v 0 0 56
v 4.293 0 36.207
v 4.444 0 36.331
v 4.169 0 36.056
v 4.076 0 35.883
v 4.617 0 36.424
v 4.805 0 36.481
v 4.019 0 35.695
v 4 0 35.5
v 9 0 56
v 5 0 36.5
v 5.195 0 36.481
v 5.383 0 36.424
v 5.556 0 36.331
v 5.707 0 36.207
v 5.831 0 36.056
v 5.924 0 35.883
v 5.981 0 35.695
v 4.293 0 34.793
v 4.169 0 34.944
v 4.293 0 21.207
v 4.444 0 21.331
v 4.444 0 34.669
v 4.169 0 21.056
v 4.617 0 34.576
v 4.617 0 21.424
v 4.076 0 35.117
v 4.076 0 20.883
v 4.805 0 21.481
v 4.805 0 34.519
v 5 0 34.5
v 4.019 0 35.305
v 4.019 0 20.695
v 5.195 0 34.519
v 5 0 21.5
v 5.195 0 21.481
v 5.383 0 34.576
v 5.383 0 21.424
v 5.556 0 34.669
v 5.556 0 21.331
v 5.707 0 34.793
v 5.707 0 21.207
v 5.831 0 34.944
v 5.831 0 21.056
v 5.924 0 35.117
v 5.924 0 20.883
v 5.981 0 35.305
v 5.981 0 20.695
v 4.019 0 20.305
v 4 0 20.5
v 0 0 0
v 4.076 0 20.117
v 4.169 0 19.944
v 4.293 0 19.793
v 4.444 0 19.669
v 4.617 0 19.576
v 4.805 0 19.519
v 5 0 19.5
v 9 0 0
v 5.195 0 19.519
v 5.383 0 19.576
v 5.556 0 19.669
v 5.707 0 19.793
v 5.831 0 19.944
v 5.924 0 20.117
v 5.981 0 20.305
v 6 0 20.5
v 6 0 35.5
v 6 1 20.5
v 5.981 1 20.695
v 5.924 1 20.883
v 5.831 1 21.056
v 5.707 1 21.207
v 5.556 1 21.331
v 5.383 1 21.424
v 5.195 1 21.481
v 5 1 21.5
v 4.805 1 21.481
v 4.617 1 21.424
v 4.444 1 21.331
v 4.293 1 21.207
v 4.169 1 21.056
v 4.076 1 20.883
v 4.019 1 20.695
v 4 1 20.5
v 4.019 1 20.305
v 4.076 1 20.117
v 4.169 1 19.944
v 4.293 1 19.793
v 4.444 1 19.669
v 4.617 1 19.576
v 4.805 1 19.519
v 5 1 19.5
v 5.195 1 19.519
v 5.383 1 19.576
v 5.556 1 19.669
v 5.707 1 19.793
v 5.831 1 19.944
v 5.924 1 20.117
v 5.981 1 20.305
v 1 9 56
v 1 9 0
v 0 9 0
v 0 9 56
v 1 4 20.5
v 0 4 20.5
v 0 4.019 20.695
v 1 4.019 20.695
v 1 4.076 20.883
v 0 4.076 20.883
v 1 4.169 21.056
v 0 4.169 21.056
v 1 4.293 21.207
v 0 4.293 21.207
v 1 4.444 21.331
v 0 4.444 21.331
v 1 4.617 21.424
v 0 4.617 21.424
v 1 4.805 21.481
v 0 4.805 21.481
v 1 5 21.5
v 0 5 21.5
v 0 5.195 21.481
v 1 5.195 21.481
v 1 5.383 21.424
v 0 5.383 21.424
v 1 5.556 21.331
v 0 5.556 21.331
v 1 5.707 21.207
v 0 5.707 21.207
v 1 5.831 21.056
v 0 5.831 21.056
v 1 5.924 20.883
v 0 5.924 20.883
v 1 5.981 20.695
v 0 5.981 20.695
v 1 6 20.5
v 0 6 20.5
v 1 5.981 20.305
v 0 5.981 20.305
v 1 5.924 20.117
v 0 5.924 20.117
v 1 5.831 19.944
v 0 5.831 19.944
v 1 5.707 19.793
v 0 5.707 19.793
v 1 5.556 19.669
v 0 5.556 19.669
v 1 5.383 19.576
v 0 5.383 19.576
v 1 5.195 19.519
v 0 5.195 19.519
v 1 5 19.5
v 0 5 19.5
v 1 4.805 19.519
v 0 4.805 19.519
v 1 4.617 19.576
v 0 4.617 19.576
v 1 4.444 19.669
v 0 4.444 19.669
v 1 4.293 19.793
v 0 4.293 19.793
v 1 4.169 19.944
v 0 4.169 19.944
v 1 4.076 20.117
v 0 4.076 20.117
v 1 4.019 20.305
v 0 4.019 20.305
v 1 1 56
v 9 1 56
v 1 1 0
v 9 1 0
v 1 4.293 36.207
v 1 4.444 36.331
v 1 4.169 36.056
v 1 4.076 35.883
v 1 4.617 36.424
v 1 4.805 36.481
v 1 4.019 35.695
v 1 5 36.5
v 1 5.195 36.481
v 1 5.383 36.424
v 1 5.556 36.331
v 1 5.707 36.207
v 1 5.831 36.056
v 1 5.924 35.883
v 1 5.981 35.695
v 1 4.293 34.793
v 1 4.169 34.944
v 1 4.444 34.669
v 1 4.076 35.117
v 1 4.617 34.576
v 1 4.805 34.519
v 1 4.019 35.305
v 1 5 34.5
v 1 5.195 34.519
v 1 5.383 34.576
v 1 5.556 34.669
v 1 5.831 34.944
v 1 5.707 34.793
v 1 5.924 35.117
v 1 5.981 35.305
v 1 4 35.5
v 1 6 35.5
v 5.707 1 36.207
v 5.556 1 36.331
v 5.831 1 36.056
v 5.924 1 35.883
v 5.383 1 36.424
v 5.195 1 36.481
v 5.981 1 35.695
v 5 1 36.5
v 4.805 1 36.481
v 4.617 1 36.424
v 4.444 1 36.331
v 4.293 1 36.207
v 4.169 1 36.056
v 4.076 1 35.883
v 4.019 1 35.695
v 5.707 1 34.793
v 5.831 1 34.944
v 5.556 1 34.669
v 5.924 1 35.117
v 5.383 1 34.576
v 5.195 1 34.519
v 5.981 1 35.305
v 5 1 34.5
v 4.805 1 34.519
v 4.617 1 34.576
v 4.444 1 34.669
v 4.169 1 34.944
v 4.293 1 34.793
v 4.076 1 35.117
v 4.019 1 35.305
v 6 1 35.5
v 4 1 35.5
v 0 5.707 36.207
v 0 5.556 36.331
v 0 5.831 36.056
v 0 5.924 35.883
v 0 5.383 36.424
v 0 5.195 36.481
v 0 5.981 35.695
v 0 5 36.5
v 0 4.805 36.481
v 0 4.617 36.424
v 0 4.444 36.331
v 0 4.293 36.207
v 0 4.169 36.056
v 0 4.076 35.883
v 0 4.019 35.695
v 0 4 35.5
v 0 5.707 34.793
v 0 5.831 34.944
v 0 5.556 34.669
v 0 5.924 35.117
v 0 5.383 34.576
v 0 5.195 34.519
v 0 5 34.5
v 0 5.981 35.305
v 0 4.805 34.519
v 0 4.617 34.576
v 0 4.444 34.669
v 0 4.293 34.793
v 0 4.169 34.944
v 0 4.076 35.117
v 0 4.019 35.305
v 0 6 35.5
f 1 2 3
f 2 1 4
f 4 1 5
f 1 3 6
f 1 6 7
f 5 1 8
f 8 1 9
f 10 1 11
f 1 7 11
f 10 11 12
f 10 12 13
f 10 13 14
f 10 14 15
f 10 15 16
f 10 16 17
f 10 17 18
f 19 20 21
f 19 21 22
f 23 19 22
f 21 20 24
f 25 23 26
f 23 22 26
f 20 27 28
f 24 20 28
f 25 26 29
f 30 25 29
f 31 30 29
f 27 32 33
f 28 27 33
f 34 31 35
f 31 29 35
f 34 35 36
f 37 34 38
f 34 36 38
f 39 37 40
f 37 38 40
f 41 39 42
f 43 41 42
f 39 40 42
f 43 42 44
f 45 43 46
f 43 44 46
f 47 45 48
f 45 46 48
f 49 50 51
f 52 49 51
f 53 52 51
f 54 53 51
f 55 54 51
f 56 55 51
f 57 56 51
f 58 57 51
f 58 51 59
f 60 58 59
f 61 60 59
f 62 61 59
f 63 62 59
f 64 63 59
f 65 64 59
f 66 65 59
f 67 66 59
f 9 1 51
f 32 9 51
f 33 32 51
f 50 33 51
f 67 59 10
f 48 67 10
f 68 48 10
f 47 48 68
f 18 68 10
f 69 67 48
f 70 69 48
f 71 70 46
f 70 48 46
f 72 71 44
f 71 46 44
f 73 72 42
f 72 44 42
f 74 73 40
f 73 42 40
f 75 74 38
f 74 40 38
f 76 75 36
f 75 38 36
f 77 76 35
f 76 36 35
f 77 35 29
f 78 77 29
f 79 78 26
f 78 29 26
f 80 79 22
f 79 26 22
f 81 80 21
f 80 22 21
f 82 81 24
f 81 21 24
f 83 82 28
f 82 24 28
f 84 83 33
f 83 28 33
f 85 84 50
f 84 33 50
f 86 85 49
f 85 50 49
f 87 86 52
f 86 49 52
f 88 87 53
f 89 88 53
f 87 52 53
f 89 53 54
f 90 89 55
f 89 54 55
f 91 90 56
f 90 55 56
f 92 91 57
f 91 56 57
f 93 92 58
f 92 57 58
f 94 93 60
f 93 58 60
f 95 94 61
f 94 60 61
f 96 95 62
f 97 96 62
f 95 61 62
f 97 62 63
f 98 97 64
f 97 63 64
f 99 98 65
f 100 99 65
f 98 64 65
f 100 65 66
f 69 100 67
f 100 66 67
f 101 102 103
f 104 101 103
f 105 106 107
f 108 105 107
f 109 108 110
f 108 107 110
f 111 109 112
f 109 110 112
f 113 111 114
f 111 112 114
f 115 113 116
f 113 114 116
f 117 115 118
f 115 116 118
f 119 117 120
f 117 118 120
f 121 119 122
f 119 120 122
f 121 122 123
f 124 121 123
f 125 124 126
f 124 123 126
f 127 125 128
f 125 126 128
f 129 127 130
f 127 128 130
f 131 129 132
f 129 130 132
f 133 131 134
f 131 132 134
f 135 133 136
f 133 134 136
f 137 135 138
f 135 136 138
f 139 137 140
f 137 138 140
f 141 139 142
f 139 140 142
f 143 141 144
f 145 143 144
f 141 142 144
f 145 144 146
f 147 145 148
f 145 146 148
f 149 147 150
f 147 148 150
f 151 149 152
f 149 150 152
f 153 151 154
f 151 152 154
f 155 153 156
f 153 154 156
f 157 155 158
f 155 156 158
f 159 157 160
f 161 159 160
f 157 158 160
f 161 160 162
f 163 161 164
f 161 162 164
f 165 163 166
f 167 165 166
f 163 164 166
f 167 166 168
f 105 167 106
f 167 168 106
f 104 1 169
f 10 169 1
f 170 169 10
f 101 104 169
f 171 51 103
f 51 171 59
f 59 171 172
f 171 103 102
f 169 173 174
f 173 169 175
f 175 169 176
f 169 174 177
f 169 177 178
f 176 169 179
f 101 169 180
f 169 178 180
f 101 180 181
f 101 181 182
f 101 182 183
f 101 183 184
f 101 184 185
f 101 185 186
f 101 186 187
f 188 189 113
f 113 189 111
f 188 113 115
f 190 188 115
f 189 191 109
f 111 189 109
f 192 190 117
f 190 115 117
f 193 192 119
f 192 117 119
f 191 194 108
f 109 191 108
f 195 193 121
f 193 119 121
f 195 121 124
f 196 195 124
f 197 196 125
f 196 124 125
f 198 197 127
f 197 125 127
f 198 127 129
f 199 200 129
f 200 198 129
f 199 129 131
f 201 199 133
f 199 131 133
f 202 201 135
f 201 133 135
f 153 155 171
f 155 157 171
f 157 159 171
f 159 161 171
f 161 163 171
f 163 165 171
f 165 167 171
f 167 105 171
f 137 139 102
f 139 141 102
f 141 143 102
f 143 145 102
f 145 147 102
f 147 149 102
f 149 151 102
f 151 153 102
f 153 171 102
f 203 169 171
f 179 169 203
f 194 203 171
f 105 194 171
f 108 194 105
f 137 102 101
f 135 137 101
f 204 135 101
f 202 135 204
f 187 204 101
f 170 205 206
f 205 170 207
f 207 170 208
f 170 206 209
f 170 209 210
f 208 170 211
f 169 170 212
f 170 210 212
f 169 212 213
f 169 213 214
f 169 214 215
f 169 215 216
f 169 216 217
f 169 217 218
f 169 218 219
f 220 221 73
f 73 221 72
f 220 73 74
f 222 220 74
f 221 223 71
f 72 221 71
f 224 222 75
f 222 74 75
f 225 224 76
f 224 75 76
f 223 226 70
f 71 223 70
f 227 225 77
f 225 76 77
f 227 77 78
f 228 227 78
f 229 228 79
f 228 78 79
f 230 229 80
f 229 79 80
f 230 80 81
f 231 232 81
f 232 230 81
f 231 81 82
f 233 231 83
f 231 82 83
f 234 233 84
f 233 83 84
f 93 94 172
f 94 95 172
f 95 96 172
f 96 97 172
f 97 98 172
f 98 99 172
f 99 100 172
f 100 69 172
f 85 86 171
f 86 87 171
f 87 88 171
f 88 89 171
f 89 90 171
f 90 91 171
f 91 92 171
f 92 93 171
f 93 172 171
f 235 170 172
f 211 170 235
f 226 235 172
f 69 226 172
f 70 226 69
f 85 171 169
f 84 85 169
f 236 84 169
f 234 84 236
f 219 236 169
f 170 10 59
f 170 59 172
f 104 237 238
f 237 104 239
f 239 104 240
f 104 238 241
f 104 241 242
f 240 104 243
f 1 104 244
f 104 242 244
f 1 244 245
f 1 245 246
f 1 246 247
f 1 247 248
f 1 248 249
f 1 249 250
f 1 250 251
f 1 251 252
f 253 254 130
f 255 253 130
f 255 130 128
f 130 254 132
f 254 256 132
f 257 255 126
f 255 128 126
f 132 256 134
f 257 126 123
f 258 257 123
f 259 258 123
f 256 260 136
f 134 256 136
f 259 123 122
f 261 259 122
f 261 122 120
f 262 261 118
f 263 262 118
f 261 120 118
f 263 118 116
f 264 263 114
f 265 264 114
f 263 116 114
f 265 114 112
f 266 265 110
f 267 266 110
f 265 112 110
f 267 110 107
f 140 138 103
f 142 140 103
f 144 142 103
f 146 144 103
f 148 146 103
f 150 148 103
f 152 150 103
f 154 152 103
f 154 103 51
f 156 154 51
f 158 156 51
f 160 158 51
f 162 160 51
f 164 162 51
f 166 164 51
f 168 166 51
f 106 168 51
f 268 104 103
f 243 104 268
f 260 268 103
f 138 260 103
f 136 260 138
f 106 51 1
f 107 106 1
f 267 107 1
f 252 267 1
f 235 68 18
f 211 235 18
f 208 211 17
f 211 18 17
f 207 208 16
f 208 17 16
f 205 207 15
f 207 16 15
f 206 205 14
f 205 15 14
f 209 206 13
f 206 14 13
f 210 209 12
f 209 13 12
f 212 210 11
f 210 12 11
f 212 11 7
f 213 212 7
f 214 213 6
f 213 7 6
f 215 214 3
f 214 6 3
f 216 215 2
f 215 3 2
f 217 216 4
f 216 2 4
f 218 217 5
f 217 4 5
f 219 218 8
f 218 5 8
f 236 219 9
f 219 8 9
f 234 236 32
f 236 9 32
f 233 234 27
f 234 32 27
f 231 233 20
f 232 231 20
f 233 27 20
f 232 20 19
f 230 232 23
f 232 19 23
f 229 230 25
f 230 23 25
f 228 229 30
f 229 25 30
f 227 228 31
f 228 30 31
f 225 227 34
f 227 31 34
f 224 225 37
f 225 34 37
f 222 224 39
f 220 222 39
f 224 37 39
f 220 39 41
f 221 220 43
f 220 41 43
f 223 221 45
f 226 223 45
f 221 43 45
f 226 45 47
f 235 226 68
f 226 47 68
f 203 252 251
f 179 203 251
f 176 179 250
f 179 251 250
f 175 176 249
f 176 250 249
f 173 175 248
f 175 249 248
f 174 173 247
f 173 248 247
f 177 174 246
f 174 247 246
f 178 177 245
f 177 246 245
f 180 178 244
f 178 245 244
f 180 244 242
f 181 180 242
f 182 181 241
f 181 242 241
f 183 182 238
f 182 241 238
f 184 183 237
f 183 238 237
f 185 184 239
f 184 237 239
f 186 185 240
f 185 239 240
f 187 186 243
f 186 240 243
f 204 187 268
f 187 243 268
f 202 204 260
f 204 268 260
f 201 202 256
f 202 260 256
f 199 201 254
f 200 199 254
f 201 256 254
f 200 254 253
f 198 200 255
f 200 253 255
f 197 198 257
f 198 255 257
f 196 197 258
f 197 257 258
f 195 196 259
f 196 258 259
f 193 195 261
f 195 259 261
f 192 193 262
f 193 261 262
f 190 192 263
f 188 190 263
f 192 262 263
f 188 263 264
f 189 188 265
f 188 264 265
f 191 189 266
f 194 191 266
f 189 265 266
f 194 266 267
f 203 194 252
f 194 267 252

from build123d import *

# Parameters (mm, degrees)
F1_DEPTH = 56
F2_R     = 1
F3_DEPTH = 1
F4_R     = 1
F5_DEPTH = 1


with BuildPart() as f1:
    # F0 (on Top) → F1 (new body)
    with BuildSketch(Plane.XY):
        Polygon((0, 9), (0, 0), (9, 0), (9, 1), (1, 1), (1, 9), align=None)
    extrude(amount=F1_DEPTH)

    # F2 (on face) → F3 (cut, through all)
    with BuildSketch(Plane.XZ):
        with Locations((5, 35.5)):
            Circle(F2_R)
        with Locations((5, 20.5)):
            Circle(F2_R)
    extrude(amount=-F3_DEPTH, mode=Mode.SUBTRACT)

    # F4 (on face) → F5 (cut, through all)
    with BuildSketch(Plane(origin=(0, 0, 0), x_dir=(0, -1, 0), z_dir=(-1, 0, 0))):
        with Locations((-5, 35.5)):
            Circle(F4_R)
        with Locations((-5, 20.5)):
            Circle(F4_R)
    extrude(amount=-F5_DEPTH, mode=Mode.SUBTRACT)


solid = f1.part
